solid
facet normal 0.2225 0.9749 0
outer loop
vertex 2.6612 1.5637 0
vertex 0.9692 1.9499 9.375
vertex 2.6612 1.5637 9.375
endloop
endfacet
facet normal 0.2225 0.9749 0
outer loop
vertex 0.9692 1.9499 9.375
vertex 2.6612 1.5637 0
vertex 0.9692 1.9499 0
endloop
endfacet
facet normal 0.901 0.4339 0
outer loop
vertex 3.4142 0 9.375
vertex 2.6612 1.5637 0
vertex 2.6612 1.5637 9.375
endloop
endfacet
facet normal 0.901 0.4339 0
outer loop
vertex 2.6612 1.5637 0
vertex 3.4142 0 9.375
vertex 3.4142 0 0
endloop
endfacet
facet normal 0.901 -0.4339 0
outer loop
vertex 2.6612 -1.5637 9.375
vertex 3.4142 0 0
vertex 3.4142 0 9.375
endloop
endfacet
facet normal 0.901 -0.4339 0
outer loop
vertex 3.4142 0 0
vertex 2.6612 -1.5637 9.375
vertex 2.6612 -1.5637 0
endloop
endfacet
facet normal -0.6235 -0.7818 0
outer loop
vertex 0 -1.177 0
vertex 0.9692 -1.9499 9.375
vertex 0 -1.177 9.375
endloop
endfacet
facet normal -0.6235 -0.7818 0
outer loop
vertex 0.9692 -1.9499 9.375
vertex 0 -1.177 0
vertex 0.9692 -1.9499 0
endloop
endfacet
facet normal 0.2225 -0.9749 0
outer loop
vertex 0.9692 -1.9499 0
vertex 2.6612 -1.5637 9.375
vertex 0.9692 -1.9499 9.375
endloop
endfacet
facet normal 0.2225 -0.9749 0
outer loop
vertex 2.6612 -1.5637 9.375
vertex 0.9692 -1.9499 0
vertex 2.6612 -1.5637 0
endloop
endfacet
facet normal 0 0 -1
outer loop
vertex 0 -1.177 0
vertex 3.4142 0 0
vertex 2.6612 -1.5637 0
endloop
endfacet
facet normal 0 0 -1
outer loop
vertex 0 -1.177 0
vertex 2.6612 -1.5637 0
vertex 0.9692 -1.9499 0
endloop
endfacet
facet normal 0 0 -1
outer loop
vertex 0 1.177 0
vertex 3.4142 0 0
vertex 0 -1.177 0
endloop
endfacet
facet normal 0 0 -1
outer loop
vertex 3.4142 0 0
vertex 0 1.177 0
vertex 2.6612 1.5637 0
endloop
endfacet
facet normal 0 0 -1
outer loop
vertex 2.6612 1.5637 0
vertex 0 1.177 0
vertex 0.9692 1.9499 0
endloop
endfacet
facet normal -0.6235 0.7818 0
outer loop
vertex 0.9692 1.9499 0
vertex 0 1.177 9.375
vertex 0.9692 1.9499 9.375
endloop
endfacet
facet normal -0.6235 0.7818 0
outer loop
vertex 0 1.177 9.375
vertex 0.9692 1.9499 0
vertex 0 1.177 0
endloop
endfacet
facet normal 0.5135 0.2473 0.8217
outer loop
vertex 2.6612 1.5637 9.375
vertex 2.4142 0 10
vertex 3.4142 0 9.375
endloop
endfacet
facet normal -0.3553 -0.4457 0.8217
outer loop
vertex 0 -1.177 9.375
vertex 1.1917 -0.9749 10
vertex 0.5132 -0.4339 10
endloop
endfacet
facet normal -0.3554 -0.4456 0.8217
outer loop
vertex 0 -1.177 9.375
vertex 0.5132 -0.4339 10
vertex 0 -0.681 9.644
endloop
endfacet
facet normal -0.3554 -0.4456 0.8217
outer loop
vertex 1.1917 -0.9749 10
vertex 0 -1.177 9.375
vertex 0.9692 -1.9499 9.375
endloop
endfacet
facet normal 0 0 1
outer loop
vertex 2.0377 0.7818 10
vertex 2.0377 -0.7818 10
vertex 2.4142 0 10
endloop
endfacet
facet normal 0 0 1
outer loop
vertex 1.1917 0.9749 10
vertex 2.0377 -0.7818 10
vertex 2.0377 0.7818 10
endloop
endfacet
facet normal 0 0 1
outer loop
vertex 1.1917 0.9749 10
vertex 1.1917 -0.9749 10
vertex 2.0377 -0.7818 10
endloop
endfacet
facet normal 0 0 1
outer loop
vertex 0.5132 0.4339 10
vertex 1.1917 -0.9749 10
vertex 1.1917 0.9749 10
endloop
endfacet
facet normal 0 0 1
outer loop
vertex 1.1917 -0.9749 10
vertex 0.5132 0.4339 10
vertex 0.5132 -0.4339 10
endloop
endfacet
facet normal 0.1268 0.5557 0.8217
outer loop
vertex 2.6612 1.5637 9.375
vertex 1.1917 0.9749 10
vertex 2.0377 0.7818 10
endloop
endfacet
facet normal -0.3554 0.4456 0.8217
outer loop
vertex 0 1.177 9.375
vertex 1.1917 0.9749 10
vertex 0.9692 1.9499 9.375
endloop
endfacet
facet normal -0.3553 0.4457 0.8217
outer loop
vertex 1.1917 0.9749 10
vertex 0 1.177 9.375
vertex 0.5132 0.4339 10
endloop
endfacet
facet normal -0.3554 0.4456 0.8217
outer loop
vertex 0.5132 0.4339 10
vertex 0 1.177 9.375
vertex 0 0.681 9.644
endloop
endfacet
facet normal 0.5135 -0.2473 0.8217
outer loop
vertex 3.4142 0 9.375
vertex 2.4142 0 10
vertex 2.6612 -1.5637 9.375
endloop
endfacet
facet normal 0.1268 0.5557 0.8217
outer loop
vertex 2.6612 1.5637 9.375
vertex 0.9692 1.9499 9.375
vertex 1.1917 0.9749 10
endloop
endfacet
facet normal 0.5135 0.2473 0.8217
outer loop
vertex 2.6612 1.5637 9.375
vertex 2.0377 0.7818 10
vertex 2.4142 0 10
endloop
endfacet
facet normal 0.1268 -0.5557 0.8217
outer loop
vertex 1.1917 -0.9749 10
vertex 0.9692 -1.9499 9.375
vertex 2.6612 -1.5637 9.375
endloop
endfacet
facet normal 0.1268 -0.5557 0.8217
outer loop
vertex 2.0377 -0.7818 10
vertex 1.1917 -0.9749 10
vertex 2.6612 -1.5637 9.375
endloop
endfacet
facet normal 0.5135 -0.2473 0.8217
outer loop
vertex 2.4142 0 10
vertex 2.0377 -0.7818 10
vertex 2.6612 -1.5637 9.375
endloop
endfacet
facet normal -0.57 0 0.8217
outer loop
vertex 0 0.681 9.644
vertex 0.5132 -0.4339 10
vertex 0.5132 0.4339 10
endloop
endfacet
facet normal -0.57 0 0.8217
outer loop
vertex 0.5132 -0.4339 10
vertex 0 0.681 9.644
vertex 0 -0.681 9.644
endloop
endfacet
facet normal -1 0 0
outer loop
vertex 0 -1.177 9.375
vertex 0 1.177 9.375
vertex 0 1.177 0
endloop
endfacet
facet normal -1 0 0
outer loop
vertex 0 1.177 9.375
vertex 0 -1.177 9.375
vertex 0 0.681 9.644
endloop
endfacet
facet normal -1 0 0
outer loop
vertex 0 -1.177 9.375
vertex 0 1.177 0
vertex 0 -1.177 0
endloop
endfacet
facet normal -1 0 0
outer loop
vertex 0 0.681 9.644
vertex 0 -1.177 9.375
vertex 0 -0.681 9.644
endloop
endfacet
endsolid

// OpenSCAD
// file: util.scad
/**
 * Copyright 2018 Mike and Nathan Fairhurst. See LICENSE for licensing.
 */

function is_number(x) = abs(x)!=undef;
function sqr(x) = x*x;
function sqrt(x) = pow(x, 0.5);

// Constants specific to this file
cube_point_rotation = [45, 35.264, 180];

// Modules to be used by all parts

// Create a cube balanced on a point. If you want a specialty
// cube, you can use [onto_point] and pass in the size.
module cube_on_point(cube_size) {
  onto_point(cube_size) cube(cube_size, center=true);
}

// Wrap around a cube of [size], and it will be placed on a
// point. Make sure size is accurate, or, when you can, use
// [cube_on_point].
module onto_point(cube_size) {
  translate([0, 0, pow(pow(cube_size/2, 2)*3, 1/2)])
    rotate(cube_point_rotation)
    children();
}

// A cube with rounded corners, with centering available as
// well, via [ccube].
module rounded_cube(size, rounding, center) {
  //realdims = is_number(dims) ? [dims, dims, dims] : dims;
  minkowski() {
    ccube(size - rounding*2, center);
    sphere(r=rounding, center=true, $fn=10);
  }
}

// Move children up by z. Just cleaner than creating a 3d
// vector transform.
module up(z) {
  translate([0, 0, z]) children();
}

// Move children down by z. Just cleaner than creating a 3d
// vector transform.
module down(z) {
  translate([0, 0, -z]) children();
}

// Convenience function for creating a partially centered cube.
//
// [ccube] stands for "centered cube." Rather than having only
// two options (center on all axes or none), the axes upon which
// the cube should be centered can be passed in via the
// constants [x], [y], and [z], from constants.scad. Note you
// can add & subtract these values for a clean API.
//
// Based on [to_center], so if you don't want a cube, or want
// to recreate the transformation of a different [ccube], you
// can use that.
//
// Example: a cube of width 10, centered on x & y
//   ccube(10, x + y)
module ccube(dims, axes) {
  to_center(dims, axes) cube(dims);
}

// The transformation of [ccube], abstracted so that it can be
// used for shapes other than a regular cube.
module to_center(dims, axes) {
  realdims = is_number(dims) ? [dims, dims, dims] : dims;
  translate([
    -realdims[0]/2 * axes[0], 
    -realdims[1]/2 * axes[1], 
    -realdims[2]/2 * axes[2]
  ]) children();
}

// Take a child, and mirror it along the sets of vectors provided. The
// vectors can be the constants [x], [y], and [z] from constants.scad.
//
// Example: Four cubes, evenly mirrored around x and y
//   mirrored([x, y]) translate([10, 10, 0]) cube(1);
module mirrored(vector_set, index = 0) {
  if (index != len(vector_set)) {
    mirror(vector_set[index]) mirrored(vector_set, index + 1) children();
    mirrored(vector_set, index + 1) children();
  } else {
    children();
  }
}
// file: constants.scad
/**
 * Copyright 2018 Mike and Nathan Fairhurst. See LICENSE for licensing.
 */

// Constants to be used by all models
cube_size = 56.5;
$tol = 0.4;
layer_count = 3;
cube_rounding = 1;
servo_block_size=[26.5,15,30];
servo_flange_length=13;
servo_flange_thickness=1.5;
servo_flange_offset=8;
servo_screw_offsets=[3, 5];
servo_screw_size = 4;
servo_gear_teeth_size = 1;
servo_gear_num_teeth = 12;
servo_gear_thickness = 6;

// Dimensional values for use with [ccube], etc.
x = [1, 0, 0];
y = [0, 1, 0];
z = [0, 0, 1];
// main file
/**
 * Copyright 2018 Mike and Nathan Fairhurst. See LICENSE for licensing.
 */
include <constants.scad>;
use <util.scad>;

pin(10,2);

// A shape that can be used for push in parts
module pin(height, radius) {
  inner_height = height * 0.9375;
  cap_height = height - inner_height;
  difference() {
    translate([radius*sqrt(2)/2, 0, 0])
      union() {
        cylinder(h=inner_height, r=radius);
        up(inner_height)
          cylinder(h=cap_height, r1=radius, r2=radius/2);
      }
    translate([-height*2, 0, 0])
      ccube(height*2, y + z);
  }
}
